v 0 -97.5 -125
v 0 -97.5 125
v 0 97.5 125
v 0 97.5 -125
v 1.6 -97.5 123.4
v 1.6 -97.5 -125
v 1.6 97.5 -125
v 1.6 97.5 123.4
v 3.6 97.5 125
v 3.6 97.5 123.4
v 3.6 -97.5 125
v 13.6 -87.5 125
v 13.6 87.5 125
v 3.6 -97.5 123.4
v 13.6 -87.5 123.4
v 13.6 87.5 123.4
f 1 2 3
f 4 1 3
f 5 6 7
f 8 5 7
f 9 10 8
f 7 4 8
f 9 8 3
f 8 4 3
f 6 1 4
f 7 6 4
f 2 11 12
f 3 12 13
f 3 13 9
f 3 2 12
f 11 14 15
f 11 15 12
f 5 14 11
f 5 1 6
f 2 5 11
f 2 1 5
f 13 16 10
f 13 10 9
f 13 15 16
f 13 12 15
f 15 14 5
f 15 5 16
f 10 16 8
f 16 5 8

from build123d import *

# Parameters (mm, degrees)
F0_W     = 195
F0_H     = 250
F1_DEPTH = 1.6
F2_W     = 195
F2_H     = 1.6
F3_DEPTH = 12
F4_SIZE  = 10


with BuildPart() as f1:
    # F0 (on Right) → F1 (new body)
    with BuildSketch(Plane.YZ):
        Rectangle(F0_W, F0_H)
    extrude(amount=F1_DEPTH)

    # F2 (on face) → F3 (join)
    with BuildSketch(Plane.YZ.offset(1.6)):
        with Locations((0, 124.2)):
            Rectangle(F2_W, F2_H)
    extrude(amount=F3_DEPTH)

    # F4
    f4_edges = [f1.edges().sort_by_distance(p)[0] for p in [
        (13.6, 97.5, 124.2),
        (13.6, -97.5, 124.2),
    ]]
    chamfer(f4_edges, length=F4_SIZE)


solid = f1.part
